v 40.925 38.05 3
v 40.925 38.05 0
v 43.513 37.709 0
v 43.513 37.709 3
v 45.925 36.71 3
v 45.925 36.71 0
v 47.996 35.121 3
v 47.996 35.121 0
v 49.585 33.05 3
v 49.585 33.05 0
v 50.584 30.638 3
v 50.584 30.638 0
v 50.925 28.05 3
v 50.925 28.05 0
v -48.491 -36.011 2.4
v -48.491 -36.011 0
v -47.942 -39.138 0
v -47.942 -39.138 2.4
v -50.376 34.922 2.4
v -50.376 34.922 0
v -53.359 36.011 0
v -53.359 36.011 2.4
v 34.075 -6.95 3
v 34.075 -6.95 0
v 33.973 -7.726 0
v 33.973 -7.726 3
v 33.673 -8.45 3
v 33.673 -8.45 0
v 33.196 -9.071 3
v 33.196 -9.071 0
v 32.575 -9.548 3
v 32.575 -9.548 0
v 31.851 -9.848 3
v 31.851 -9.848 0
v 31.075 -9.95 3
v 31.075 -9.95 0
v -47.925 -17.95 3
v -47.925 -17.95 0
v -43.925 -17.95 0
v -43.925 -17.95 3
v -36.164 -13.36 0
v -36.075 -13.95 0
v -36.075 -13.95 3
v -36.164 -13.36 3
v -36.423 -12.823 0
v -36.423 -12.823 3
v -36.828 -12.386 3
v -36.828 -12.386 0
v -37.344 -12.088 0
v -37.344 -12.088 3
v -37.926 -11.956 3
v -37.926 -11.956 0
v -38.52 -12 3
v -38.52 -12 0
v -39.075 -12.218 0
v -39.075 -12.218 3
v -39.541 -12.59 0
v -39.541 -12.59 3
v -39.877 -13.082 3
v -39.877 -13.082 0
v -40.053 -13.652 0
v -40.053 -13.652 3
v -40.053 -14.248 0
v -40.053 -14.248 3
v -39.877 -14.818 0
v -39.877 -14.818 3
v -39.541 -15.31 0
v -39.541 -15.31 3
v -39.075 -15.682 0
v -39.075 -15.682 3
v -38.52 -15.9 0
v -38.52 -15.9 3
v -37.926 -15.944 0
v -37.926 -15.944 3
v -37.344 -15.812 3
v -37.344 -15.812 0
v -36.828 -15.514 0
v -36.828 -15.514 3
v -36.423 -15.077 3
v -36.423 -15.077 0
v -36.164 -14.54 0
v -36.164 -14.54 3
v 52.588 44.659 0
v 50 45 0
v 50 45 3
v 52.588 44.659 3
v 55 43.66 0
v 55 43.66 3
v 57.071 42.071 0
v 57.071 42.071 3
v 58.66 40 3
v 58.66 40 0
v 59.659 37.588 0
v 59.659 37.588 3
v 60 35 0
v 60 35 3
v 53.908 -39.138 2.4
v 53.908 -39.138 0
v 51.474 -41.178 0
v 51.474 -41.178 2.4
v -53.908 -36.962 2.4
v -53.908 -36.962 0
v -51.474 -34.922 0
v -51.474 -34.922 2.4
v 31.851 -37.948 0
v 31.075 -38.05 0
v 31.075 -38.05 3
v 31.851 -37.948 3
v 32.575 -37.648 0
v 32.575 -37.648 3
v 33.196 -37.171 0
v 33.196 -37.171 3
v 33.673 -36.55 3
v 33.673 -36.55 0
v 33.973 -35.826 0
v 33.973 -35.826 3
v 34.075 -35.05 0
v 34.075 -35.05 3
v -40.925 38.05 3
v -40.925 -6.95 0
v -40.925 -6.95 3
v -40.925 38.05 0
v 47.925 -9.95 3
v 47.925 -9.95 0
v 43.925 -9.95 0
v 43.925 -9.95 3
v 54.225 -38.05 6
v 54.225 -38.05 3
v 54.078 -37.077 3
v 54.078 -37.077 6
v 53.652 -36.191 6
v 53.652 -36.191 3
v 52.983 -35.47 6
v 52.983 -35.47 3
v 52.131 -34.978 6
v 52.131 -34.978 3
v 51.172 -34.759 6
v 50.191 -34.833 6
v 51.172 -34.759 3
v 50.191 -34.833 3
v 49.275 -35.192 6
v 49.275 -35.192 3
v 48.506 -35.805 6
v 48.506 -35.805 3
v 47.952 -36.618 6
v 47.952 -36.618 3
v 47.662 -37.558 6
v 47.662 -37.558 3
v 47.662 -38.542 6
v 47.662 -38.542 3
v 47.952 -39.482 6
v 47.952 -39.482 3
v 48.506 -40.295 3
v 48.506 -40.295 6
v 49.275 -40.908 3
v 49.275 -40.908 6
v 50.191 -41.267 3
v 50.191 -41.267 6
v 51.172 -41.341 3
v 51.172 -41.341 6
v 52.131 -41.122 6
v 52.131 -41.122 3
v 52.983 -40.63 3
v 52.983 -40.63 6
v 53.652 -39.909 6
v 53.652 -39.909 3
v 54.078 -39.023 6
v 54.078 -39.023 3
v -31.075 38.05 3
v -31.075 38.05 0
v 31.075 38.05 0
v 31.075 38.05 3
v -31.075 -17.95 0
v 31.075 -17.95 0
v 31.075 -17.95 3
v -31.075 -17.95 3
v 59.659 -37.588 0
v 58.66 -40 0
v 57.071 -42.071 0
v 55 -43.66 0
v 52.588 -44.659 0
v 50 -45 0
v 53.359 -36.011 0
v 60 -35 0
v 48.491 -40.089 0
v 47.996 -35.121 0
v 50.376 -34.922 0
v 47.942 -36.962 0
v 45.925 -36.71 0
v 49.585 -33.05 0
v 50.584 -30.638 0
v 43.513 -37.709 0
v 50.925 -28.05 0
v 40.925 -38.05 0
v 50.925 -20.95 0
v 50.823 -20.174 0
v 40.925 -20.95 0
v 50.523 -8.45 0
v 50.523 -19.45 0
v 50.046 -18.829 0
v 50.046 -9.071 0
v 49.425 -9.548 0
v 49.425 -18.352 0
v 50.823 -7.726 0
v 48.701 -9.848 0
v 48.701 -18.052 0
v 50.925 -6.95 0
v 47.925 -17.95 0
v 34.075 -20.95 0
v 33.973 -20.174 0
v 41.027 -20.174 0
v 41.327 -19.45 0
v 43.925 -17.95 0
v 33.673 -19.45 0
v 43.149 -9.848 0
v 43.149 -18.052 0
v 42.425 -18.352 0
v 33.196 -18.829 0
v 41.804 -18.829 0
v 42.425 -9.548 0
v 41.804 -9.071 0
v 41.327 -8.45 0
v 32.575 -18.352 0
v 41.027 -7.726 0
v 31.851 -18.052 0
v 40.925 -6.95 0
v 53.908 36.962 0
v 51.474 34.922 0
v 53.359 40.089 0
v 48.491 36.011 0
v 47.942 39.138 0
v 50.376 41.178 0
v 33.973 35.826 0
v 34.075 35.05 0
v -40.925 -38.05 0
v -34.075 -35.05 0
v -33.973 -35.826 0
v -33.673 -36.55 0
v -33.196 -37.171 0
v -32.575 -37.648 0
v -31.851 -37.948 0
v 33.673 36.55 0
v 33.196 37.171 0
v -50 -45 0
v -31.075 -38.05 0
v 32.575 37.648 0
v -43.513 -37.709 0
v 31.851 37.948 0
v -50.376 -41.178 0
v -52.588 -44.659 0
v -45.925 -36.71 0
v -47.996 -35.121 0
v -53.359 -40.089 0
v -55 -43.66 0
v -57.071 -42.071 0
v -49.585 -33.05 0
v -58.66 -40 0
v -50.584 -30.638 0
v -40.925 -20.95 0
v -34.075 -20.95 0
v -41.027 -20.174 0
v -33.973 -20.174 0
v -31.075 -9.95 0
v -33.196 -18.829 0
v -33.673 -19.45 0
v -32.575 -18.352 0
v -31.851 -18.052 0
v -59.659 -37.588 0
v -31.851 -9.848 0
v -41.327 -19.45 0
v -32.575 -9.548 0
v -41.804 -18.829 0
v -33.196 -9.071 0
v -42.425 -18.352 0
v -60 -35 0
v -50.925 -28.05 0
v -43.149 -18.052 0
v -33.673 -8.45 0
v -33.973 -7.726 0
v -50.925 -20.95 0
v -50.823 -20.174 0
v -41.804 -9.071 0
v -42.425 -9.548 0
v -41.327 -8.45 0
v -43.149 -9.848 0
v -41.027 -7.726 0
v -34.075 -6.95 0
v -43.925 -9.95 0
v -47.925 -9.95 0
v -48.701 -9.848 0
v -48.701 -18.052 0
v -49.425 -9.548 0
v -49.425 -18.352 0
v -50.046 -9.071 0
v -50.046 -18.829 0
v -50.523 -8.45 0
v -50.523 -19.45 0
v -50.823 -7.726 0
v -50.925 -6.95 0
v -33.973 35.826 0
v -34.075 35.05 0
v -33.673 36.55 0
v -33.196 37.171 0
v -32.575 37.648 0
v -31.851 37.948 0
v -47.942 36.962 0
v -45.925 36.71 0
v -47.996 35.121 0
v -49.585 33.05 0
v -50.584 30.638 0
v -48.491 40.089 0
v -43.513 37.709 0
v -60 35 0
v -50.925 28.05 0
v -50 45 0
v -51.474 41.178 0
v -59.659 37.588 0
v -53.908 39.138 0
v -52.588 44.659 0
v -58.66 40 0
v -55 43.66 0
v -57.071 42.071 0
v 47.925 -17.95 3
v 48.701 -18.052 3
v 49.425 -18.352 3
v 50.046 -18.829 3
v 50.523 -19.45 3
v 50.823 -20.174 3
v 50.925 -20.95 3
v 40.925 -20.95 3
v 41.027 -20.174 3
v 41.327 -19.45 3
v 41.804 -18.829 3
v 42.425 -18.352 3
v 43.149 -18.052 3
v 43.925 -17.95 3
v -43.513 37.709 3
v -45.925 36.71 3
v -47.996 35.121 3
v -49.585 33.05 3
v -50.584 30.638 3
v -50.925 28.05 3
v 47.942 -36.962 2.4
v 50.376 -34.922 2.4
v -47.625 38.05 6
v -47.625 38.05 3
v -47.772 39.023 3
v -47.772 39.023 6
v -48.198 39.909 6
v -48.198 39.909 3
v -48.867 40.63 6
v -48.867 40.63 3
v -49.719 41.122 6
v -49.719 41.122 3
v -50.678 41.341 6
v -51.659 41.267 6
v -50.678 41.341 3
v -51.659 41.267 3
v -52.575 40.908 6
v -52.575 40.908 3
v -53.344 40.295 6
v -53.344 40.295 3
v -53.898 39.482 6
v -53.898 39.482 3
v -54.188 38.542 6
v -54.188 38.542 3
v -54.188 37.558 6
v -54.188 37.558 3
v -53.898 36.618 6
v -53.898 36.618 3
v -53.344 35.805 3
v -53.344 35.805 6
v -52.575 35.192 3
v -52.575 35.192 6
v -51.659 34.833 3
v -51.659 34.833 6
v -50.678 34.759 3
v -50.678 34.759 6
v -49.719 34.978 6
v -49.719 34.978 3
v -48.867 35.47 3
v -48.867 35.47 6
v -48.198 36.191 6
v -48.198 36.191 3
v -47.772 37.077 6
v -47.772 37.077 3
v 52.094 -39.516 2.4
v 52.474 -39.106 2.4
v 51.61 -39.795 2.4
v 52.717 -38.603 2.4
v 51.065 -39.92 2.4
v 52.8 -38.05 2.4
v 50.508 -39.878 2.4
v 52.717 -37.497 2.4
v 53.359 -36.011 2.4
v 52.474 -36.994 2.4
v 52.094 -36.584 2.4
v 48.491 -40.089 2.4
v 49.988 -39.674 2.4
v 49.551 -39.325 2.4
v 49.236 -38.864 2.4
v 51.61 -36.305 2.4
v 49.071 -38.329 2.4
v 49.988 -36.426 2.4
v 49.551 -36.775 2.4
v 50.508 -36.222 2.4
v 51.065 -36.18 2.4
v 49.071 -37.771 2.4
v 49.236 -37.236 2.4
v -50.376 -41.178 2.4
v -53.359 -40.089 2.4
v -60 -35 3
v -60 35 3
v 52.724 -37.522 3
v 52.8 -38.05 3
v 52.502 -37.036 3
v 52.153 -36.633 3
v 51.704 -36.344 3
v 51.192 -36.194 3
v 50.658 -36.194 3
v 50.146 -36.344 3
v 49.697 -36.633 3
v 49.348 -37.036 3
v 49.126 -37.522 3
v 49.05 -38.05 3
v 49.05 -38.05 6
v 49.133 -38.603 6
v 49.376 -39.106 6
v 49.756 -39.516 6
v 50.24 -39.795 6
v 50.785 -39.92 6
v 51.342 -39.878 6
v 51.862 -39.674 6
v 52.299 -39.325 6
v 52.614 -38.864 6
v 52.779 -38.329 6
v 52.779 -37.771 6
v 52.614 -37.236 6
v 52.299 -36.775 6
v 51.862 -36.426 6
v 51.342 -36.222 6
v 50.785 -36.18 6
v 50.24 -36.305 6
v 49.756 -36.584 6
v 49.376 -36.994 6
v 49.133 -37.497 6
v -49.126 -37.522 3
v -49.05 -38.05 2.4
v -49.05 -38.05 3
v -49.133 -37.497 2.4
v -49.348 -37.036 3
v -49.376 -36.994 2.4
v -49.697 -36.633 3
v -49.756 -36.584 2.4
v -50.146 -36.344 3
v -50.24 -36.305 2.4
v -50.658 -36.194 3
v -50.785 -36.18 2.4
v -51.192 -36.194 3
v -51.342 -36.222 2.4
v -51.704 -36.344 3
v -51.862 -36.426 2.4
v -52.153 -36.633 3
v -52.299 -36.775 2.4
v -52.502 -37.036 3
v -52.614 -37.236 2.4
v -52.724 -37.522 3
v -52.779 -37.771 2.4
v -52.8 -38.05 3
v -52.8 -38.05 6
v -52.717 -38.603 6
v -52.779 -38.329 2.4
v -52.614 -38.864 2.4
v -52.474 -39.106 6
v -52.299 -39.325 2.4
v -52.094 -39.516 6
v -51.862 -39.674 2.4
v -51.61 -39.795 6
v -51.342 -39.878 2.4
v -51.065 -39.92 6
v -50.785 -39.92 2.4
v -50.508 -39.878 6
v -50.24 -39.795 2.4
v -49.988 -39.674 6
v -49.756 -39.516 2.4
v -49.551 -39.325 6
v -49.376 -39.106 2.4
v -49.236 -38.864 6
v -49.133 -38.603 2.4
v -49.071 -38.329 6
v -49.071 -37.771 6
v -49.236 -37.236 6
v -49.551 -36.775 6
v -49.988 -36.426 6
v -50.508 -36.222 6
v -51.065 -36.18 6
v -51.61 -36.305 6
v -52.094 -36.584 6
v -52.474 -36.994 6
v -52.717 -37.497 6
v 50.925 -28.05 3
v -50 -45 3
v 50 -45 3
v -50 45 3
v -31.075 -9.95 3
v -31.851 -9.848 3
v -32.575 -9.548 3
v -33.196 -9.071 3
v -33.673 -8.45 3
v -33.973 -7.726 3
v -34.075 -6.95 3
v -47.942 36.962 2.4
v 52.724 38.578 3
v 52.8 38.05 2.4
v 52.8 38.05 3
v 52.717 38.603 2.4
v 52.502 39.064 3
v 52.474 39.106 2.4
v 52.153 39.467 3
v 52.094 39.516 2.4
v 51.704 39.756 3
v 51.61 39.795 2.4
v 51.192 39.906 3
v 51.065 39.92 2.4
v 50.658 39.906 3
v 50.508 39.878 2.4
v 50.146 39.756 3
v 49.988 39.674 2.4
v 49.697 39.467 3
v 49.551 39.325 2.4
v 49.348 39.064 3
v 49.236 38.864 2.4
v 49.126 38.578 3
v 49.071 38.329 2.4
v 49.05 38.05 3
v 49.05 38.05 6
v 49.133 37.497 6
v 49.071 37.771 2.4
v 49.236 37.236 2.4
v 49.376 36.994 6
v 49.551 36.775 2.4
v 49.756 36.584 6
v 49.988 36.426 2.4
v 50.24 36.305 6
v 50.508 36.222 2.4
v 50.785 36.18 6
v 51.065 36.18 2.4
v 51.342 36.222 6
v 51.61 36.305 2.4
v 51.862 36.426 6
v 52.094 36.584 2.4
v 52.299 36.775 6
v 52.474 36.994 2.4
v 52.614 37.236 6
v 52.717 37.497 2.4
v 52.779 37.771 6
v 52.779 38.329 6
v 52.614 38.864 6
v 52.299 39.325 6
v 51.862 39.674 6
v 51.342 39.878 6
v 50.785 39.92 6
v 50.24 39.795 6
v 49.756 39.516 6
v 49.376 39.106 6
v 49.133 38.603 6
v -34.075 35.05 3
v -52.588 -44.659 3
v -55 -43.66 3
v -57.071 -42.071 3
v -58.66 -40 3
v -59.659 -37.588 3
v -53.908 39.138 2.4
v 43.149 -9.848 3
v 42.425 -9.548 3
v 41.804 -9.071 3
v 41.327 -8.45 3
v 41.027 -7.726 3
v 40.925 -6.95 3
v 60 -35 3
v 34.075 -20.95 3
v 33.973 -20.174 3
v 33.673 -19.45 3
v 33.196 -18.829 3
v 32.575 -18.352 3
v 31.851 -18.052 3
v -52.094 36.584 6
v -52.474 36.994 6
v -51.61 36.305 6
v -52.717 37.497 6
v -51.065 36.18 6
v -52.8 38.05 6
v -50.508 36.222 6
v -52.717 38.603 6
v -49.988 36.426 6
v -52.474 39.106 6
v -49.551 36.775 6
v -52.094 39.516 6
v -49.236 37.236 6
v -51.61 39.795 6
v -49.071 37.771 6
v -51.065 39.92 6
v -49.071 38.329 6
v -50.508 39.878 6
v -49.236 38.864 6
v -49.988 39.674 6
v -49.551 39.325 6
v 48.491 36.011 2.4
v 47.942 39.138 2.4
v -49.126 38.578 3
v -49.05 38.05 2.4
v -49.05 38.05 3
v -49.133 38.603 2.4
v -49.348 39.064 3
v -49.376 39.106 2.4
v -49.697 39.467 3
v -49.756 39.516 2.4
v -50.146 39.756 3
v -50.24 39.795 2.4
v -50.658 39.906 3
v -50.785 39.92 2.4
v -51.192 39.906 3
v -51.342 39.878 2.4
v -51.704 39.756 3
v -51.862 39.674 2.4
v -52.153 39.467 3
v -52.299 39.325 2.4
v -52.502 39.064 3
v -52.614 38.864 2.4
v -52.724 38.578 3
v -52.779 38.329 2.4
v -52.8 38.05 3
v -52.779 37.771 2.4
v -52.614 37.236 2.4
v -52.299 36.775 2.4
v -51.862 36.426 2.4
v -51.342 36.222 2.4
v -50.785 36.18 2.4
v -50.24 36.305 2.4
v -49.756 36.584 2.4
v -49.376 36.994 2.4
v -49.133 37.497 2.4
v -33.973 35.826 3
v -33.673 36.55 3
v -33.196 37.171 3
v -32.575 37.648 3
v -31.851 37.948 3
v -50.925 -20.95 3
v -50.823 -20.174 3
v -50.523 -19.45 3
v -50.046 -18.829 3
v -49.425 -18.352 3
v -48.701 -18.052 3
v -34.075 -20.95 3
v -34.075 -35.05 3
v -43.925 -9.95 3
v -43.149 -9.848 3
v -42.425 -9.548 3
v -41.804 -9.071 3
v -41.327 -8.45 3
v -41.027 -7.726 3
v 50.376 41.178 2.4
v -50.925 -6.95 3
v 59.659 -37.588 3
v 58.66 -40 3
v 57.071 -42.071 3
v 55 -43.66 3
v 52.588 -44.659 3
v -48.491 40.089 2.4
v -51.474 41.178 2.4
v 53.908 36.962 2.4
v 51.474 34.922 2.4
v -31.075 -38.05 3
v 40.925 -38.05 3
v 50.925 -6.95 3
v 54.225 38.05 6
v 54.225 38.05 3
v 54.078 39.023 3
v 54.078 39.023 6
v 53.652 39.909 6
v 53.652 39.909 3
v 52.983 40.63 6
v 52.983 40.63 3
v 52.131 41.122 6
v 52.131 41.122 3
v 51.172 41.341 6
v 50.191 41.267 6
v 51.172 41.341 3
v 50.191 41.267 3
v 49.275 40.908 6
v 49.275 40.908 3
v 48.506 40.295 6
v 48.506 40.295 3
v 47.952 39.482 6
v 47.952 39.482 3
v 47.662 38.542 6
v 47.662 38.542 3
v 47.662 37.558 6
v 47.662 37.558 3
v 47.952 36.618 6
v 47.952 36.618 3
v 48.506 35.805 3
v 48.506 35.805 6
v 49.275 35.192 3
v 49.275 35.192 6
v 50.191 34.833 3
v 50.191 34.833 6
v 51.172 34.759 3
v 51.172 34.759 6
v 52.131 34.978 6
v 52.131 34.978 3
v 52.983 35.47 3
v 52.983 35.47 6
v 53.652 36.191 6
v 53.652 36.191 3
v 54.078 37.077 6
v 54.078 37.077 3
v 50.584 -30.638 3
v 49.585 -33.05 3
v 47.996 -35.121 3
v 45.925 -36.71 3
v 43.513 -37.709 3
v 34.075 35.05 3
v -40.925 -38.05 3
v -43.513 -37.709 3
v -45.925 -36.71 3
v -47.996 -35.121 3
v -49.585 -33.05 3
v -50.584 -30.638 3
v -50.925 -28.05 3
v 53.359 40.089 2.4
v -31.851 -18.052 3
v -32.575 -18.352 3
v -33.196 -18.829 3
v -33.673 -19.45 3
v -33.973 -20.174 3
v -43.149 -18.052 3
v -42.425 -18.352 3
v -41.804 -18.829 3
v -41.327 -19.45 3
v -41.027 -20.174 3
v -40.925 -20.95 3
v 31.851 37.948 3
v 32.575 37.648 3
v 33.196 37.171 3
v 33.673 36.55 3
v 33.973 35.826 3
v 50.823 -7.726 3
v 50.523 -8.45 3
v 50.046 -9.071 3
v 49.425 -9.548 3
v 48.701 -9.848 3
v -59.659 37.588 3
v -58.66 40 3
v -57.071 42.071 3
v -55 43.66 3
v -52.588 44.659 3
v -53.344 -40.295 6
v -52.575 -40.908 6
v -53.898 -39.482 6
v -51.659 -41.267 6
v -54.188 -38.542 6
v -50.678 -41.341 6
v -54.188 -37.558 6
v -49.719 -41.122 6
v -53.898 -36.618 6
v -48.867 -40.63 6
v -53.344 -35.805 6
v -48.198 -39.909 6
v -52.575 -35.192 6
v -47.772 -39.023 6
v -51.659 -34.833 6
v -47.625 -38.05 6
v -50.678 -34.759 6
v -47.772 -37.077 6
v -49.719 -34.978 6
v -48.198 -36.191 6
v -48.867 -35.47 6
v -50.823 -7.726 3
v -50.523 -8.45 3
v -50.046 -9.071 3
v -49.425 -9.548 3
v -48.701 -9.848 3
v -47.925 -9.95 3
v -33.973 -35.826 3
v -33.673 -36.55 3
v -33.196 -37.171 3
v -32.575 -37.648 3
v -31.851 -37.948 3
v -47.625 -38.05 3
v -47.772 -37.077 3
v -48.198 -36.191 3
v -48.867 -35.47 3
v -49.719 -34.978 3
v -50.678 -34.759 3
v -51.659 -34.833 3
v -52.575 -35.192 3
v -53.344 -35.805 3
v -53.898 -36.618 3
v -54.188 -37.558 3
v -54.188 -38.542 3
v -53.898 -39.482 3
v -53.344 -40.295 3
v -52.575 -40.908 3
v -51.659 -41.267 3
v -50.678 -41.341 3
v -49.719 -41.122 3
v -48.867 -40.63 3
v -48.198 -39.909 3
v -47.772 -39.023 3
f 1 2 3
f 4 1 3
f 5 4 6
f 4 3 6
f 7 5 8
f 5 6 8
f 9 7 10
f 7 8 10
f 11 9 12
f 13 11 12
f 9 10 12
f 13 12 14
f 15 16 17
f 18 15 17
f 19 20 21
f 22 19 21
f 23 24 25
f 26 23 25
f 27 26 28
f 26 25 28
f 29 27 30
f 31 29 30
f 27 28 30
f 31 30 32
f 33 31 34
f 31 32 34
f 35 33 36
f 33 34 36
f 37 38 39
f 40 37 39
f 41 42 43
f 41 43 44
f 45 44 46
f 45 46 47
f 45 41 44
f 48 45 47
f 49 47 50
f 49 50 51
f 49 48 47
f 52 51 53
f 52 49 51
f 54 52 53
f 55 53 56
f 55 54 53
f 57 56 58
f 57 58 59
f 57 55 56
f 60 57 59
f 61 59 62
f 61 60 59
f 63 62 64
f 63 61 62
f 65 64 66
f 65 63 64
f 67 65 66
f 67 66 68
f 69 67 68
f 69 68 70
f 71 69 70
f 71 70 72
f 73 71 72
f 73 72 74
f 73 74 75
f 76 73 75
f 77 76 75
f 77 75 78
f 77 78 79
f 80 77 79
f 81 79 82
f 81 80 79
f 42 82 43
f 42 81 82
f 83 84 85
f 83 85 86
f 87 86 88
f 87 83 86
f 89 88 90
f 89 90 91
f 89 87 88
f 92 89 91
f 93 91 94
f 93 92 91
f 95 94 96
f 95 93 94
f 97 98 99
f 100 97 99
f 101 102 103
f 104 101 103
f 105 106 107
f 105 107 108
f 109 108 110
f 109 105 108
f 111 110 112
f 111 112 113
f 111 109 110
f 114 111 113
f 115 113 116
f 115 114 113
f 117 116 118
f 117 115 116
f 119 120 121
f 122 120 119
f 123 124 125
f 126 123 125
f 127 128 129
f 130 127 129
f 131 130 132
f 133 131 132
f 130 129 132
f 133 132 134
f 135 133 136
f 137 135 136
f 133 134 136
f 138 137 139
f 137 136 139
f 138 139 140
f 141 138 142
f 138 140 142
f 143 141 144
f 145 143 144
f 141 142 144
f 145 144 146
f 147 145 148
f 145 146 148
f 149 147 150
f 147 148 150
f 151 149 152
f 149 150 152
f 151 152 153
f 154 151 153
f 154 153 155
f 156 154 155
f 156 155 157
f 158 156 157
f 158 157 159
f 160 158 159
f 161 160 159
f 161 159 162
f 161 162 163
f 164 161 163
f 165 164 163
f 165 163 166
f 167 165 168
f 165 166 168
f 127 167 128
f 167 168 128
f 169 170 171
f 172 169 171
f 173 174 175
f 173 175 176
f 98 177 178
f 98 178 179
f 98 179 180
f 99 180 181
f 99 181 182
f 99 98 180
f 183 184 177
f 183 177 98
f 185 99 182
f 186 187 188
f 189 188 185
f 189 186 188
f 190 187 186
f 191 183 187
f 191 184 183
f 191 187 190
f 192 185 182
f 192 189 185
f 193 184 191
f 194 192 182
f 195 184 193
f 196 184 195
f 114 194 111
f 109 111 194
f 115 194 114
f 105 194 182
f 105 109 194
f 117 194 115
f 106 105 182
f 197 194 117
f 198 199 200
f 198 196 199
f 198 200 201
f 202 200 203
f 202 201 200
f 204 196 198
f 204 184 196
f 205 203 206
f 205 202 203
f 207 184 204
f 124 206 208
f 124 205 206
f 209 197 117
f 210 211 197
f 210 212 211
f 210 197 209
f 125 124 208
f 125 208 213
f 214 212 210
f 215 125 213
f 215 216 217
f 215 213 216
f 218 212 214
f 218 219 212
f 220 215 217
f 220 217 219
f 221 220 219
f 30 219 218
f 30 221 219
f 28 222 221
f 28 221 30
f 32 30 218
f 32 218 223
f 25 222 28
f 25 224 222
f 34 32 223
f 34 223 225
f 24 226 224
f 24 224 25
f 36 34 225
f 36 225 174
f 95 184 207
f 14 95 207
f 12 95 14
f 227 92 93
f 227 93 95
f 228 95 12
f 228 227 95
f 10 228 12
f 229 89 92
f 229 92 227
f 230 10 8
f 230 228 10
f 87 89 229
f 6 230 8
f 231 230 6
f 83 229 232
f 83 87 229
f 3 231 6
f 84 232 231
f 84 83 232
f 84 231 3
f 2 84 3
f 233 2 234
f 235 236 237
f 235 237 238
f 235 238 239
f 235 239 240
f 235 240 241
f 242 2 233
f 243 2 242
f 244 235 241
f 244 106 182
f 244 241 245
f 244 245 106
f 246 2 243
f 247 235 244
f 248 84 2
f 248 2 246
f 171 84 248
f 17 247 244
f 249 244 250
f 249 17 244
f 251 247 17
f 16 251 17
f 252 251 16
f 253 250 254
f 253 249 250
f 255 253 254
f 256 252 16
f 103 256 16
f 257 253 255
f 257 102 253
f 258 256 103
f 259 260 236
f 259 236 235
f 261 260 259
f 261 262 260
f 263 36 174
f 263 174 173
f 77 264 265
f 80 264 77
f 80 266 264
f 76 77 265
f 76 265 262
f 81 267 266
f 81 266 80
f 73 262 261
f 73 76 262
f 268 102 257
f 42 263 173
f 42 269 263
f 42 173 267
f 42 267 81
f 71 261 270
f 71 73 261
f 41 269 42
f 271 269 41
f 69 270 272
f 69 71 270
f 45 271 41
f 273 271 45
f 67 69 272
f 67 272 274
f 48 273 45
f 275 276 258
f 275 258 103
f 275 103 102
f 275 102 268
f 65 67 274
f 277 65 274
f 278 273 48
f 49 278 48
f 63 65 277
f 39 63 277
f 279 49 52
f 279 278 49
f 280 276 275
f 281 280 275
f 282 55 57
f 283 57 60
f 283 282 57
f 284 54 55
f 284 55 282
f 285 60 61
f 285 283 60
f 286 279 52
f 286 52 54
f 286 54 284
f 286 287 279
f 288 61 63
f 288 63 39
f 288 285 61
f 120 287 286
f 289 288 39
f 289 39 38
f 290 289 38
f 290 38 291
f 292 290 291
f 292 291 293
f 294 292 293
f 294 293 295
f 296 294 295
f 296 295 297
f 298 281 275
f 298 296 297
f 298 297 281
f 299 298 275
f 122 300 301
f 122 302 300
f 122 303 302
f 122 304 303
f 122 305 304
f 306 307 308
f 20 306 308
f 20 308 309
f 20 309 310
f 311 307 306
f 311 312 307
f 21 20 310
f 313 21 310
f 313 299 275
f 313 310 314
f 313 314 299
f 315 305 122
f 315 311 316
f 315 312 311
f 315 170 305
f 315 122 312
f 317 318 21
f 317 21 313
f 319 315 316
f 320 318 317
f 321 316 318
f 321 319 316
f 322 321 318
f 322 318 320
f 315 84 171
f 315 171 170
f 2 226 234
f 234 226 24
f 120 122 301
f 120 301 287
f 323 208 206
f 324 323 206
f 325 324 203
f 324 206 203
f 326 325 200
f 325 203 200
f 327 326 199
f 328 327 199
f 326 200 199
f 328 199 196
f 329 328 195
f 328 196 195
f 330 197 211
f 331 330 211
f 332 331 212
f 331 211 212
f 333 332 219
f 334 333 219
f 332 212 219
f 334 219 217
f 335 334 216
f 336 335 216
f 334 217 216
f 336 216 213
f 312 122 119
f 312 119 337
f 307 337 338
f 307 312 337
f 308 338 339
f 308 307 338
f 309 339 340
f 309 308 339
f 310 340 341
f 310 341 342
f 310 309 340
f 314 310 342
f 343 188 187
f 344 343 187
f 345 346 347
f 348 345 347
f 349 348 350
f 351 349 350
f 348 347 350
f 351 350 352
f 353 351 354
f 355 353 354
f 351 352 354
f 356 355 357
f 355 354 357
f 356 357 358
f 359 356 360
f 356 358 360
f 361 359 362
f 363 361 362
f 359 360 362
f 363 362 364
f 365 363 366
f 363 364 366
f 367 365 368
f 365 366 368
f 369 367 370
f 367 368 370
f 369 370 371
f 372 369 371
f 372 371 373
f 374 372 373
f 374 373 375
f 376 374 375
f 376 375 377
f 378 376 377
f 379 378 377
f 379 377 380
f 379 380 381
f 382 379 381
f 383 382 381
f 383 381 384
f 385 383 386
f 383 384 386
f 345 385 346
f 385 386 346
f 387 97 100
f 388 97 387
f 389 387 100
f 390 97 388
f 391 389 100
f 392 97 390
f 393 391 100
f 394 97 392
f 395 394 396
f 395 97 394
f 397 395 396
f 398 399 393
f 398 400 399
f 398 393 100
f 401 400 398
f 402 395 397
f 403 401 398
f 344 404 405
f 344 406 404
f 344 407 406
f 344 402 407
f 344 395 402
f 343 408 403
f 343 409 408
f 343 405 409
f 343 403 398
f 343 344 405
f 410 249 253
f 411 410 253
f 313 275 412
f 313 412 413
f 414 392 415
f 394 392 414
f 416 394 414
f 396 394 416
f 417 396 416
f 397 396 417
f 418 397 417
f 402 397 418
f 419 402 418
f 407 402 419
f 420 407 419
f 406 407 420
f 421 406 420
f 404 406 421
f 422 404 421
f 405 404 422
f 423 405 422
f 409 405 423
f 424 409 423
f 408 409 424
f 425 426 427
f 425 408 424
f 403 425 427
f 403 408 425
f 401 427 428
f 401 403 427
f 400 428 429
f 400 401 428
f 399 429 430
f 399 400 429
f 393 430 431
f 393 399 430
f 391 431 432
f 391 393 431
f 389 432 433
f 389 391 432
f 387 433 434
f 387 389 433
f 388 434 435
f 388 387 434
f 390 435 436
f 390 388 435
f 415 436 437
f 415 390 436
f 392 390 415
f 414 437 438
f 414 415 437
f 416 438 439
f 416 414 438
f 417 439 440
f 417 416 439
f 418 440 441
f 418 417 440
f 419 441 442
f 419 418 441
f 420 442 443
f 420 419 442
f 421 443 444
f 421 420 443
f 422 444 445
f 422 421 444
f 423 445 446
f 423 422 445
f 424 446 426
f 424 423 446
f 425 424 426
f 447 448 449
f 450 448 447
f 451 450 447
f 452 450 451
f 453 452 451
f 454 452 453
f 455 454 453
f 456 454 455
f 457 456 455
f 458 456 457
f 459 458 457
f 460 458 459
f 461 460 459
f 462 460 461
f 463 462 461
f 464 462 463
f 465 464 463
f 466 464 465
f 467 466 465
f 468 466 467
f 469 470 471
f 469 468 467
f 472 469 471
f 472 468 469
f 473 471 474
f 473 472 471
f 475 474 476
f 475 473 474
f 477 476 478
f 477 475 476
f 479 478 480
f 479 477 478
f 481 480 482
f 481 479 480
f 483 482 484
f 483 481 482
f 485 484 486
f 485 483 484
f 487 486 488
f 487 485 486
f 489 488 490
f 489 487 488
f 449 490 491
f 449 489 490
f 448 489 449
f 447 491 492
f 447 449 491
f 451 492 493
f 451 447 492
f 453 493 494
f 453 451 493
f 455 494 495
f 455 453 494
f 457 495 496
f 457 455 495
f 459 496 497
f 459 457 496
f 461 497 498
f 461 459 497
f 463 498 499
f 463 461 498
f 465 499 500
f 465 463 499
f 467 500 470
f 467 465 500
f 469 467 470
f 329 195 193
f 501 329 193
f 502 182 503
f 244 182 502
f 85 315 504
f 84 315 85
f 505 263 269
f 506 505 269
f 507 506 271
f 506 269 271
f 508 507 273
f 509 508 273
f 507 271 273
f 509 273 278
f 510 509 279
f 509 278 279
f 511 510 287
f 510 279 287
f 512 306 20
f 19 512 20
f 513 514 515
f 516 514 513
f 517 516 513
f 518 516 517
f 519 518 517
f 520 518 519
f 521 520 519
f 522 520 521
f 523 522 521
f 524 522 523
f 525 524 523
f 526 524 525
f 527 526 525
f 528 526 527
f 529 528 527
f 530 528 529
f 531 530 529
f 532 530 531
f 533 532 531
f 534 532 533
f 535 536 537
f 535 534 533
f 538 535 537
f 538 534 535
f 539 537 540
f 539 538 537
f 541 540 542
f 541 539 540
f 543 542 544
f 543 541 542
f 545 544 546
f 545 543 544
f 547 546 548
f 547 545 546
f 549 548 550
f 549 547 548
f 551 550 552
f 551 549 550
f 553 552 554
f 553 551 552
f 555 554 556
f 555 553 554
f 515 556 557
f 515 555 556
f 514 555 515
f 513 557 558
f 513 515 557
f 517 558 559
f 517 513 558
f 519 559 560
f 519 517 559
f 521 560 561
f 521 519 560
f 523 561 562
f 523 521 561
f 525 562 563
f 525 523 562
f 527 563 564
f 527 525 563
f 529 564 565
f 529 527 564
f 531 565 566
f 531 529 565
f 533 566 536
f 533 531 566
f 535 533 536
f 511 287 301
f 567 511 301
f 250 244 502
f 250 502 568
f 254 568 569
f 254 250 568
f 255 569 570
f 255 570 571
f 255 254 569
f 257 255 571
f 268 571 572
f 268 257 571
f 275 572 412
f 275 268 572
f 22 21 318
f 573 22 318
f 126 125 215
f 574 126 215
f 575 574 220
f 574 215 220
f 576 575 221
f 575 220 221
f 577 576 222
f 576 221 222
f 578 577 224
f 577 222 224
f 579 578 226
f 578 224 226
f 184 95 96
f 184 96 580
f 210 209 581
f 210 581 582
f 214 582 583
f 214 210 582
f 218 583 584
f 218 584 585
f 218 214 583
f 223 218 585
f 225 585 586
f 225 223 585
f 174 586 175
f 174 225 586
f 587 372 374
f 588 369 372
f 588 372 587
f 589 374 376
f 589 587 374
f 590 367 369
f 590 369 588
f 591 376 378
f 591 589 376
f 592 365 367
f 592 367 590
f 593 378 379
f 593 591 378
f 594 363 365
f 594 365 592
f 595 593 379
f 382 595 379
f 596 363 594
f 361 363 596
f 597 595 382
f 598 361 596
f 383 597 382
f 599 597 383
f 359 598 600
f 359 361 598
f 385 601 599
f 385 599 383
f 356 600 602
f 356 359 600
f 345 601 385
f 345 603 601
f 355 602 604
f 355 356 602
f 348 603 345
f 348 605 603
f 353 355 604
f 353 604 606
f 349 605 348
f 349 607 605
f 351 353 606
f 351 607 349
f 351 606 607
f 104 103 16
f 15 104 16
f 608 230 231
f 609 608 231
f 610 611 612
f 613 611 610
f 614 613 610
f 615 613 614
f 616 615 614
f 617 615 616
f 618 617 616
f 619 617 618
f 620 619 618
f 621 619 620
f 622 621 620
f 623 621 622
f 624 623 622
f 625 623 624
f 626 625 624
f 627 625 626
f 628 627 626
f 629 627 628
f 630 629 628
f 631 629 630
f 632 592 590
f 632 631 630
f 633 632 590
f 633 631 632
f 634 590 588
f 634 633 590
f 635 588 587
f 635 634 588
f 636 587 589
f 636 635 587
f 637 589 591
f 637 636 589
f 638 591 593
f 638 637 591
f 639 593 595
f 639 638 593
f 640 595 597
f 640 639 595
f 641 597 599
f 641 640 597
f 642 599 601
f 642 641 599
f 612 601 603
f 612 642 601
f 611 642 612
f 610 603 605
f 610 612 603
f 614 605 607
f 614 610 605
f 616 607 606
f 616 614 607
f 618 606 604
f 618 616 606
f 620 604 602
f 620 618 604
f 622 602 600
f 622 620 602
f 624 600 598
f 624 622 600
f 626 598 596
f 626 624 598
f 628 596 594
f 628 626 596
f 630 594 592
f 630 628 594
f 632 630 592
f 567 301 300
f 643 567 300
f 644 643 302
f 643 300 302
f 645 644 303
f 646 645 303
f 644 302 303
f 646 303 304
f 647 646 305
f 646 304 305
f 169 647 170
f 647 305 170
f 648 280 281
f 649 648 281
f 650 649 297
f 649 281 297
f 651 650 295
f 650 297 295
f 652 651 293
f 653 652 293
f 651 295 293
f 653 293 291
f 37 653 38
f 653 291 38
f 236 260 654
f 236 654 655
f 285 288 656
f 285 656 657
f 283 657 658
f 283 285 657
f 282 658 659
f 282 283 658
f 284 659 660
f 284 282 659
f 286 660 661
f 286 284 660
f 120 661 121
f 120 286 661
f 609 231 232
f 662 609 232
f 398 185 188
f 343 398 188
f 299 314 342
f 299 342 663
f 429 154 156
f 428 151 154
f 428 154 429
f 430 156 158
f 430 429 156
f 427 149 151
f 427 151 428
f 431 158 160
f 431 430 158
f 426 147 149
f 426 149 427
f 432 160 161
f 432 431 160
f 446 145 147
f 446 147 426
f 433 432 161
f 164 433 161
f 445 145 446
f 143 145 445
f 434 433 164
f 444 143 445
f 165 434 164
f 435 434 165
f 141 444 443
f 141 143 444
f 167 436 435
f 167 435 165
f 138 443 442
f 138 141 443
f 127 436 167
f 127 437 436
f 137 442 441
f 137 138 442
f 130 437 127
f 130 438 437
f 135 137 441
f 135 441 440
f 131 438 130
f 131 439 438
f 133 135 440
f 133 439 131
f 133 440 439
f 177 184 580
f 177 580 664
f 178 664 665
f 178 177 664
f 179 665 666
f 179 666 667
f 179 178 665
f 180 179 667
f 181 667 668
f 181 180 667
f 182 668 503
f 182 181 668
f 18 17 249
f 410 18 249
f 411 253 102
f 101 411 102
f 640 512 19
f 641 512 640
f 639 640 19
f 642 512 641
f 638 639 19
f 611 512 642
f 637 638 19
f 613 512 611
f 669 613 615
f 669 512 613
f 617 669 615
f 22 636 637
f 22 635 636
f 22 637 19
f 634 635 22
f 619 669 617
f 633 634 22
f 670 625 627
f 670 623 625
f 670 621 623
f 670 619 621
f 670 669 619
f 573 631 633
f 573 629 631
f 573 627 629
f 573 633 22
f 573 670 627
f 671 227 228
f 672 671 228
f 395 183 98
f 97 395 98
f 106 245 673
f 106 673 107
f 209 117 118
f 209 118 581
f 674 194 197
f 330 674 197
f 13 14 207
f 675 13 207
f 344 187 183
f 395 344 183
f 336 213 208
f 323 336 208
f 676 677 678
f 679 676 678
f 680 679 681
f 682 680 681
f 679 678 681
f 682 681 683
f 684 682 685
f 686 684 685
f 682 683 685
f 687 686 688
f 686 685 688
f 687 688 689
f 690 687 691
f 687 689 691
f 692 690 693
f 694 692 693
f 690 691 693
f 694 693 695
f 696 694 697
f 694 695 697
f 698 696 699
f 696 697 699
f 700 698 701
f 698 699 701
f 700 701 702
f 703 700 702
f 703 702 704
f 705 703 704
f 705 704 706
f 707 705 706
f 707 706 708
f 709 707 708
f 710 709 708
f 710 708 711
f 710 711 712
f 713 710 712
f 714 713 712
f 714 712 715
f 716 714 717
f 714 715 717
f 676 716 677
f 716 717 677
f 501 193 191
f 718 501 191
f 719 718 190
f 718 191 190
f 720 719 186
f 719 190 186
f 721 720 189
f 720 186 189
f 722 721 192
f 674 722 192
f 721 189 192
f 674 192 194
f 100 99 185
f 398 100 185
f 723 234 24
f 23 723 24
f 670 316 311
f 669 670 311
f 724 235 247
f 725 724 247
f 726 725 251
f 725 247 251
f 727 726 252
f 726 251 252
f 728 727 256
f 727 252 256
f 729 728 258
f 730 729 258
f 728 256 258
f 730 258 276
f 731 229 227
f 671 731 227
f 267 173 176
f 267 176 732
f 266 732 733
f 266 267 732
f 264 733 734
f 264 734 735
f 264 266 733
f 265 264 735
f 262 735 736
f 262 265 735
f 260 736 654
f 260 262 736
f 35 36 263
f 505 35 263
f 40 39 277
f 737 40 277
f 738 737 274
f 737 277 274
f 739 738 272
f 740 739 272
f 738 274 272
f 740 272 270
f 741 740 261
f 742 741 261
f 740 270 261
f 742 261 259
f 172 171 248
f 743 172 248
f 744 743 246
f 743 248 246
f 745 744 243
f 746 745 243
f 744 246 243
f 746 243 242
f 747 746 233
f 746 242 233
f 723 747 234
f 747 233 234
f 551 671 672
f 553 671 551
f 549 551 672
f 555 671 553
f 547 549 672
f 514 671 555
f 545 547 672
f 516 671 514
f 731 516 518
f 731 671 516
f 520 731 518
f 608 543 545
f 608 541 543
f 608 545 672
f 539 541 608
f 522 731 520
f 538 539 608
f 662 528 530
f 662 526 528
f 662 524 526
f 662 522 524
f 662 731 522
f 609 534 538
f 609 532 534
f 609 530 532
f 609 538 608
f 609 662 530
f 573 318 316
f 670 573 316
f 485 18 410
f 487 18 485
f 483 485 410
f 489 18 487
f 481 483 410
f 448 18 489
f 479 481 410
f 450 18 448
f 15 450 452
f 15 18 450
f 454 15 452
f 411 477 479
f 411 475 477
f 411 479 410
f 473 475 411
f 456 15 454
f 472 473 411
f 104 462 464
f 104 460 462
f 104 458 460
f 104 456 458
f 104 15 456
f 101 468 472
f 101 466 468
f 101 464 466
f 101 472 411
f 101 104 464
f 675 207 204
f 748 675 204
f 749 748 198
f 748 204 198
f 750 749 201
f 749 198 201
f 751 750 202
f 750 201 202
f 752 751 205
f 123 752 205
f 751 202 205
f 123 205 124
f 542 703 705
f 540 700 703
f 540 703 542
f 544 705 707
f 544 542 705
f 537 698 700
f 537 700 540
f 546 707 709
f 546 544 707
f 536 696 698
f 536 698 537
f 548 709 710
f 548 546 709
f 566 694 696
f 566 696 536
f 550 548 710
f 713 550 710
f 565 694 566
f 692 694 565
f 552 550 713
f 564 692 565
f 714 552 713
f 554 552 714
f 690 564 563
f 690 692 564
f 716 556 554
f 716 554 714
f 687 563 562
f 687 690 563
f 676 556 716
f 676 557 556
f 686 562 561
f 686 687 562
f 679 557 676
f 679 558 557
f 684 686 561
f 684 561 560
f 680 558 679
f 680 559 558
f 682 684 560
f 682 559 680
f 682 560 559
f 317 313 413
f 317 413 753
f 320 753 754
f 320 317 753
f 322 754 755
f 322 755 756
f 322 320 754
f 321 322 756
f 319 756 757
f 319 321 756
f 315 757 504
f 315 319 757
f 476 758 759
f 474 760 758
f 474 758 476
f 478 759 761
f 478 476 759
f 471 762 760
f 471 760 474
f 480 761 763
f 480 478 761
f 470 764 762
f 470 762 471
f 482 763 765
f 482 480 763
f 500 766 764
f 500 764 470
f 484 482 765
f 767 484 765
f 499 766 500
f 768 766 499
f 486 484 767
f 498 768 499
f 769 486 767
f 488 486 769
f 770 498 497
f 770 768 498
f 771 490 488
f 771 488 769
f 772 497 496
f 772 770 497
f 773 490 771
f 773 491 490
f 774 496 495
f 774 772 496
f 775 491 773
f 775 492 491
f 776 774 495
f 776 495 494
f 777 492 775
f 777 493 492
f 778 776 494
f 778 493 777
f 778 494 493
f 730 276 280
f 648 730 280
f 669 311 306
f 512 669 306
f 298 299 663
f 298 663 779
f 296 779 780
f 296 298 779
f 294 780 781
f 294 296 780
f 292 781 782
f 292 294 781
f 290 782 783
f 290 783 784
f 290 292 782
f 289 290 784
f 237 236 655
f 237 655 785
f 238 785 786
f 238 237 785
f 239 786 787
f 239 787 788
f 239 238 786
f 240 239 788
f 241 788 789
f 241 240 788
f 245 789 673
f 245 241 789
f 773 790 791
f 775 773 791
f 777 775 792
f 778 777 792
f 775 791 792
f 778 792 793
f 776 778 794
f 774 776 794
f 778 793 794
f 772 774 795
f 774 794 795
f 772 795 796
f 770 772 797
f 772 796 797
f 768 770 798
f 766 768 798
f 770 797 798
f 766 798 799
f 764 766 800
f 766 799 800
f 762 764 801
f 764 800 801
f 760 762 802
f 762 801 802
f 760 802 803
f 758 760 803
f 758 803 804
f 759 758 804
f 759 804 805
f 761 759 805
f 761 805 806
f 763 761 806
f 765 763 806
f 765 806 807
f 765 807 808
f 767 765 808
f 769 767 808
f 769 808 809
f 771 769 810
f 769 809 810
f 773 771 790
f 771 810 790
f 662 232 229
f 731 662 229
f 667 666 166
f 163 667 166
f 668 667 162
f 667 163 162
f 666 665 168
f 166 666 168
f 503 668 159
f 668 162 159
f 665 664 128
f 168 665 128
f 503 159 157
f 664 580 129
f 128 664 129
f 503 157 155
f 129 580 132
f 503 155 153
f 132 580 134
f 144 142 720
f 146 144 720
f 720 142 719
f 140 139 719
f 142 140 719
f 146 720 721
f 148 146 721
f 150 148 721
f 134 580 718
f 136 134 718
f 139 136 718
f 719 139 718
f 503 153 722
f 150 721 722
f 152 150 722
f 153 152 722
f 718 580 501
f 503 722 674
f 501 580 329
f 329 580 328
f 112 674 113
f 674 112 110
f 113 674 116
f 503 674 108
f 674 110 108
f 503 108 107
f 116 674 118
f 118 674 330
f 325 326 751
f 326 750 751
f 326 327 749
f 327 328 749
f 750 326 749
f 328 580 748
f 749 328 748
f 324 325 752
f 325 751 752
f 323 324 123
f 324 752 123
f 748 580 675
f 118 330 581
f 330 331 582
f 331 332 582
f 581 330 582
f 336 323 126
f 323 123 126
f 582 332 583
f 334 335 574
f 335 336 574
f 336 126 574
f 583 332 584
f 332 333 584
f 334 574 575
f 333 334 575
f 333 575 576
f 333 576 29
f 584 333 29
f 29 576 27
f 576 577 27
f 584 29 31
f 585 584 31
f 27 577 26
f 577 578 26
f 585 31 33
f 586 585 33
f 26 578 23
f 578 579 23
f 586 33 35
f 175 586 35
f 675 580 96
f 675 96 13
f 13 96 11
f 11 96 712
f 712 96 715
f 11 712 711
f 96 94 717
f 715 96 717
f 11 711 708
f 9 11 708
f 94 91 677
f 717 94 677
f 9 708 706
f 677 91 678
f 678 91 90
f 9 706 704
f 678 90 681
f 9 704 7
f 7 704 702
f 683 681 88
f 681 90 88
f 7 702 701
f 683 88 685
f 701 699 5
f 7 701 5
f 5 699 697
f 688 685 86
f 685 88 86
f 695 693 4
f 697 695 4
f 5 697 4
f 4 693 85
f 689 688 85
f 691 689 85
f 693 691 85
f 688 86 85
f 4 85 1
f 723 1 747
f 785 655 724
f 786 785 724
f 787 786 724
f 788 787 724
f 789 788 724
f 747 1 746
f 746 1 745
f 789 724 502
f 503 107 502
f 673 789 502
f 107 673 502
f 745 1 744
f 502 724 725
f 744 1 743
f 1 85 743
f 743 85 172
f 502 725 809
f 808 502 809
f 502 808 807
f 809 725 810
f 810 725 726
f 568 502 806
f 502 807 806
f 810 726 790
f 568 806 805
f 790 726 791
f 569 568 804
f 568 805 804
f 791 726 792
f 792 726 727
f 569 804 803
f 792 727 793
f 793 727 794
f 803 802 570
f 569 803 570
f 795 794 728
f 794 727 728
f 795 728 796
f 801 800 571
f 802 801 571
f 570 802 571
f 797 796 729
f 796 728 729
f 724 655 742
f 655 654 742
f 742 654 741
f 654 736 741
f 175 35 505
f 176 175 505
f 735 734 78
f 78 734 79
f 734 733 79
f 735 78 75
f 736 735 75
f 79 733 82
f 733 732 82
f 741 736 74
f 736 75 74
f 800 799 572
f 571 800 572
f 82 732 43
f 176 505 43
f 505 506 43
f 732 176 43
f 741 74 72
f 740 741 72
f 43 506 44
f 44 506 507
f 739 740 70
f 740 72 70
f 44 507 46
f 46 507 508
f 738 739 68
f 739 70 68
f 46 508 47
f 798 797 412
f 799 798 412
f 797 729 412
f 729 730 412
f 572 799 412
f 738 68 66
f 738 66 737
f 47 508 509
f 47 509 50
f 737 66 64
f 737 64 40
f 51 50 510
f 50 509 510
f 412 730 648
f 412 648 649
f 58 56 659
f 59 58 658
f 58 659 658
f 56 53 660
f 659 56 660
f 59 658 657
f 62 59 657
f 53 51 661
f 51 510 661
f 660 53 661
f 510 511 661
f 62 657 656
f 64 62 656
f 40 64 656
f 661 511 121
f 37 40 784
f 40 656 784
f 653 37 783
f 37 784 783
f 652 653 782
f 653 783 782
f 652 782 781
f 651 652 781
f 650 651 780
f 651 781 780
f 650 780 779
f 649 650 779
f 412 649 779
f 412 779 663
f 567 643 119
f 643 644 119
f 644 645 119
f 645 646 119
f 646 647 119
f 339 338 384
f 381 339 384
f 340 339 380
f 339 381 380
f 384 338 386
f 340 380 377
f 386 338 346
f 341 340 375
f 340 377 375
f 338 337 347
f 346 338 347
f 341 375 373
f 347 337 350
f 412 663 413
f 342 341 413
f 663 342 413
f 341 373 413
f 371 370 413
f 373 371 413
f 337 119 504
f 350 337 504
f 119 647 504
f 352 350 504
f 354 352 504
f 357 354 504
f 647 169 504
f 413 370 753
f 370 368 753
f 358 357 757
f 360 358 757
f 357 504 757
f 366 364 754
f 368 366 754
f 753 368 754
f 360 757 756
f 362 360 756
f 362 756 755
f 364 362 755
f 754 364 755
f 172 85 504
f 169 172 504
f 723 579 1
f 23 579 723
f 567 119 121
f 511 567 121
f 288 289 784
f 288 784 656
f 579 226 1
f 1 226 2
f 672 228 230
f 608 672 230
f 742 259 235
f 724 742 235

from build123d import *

# Parameters (mm, degrees)
IZIM1_R                     = 1.875
IZIM1_R_2                   = 2
Y_KSEKLIK_EKSTR_ZYON2_DEPTH = 3
KES_EKSTR_ZYON1_DEPTH       = 2.4
IZIM3_R                     = 3.3
IZIM3_R_2                   = 1.875
Y_KSEKLIK_EKSTR_ZYON3_DEPTH = 3


with BuildPart() as part:
    # Çizim1 → Yükseklik-Ekstrüzyon2 (new body)
    with BuildSketch(Plane.XY):
        with BuildLine():
            Line((-50, 45), (50, 45))
            ThreePointArc((50, 45), (57.071067812, 42.071067812), (60, 35))
            Line((60, 35), (60, -35))
            ThreePointArc((60, -35), (57.071067812, -42.071067812), (50, -45))
            Line((50, -45), (-50, -45))
            ThreePointArc((-50, -45), (-57.071067812, -42.071067812), (-60, -35))
            Line((-60, -35), (-60, 35))
            ThreePointArc((-60, 35), (-57.071067812, 42.071067812), (-50, 45))
        make_face()
        with Locations((-50.925, 38.05)):
            Circle(IZIM1_R, mode=Mode.SUBTRACT)
        with Locations((50.925, 38.05)):
            Circle(IZIM1_R, mode=Mode.SUBTRACT)
        with Locations((-50.925, -38.05)):
            Circle(IZIM1_R, mode=Mode.SUBTRACT)
        with Locations((50.925, -38.05)):
            Circle(IZIM1_R, mode=Mode.SUBTRACT)
        with Locations((-38.075, -13.95)):
            Circle(IZIM1_R_2, mode=Mode.SUBTRACT)
        with BuildLine():
            Line((-31.075, -38.05), (31.075, -38.05))
            ThreePointArc((31.075, -38.05), (33.196320344, -37.171320344), (34.075, -35.05))
            Line((34.075, -35.05), (34.075, -20.95))
            ThreePointArc((34.075, -20.95), (33.196320344, -18.828679656), (31.075, -17.95))
            Line((31.075, -17.95), (-31.075, -17.95))
            ThreePointArc((-31.075, -17.95), (-33.196320344, -18.828679656), (-34.075, -20.95))
            Line((-34.075, -20.95), (-34.075, -35.05))
            ThreePointArc((-34.075, -35.05), (-33.196320344, -37.171320344), (-31.075, -38.05))
        make_face(mode=Mode.SUBTRACT)
        with BuildLine():
            Line((50.925, 28.05), (50.925, -6.95))
            ThreePointArc((50.925, -6.95), (50.046320344, -9.071320344), (47.925, -9.95))
            Line((47.925, -9.95), (43.925, -9.95))
            ThreePointArc((43.925, -9.95), (41.803679656, -9.071320344), (40.925, -6.95))
            Line((40.925, -6.95), (40.925, 38.05))
            ThreePointArc((40.925, 38.05), (47.996067812, 35.121067812), (50.925, 28.05))
        make_face(mode=Mode.SUBTRACT)
        with BuildLine():
            Line((-31.075, 38.05), (31.075, 38.05))
            ThreePointArc((31.075, 38.05), (33.196320344, 37.171320344), (34.075, 35.05))
            Line((34.075, 35.05), (34.075, -6.95))
            ThreePointArc((34.075, -6.95), (33.196320344, -9.071320344), (31.075, -9.95))
            Line((31.075, -9.95), (-31.075, -9.95))
            ThreePointArc((-31.075, -9.95), (-33.196320344, -9.071320344), (-34.075, -6.95))
            Line((-34.075, -6.95), (-34.075, 35.05))
            ThreePointArc((-34.075, 35.05), (-33.196320344, 37.171320344), (-31.075, 38.05))
        make_face(mode=Mode.SUBTRACT)
        with BuildLine():
            Line((-50.925, 28.05), (-50.925, -6.95))
            ThreePointArc((-50.925, -6.95), (-50.046320344, -9.071320344), (-47.925, -9.95))
            Line((-47.925, -9.95), (-43.925, -9.95))
            ThreePointArc((-43.925, -9.95), (-41.803679656, -9.071320344), (-40.925, -6.95))
            Line((-40.925, -6.95), (-40.925, 38.05))
            ThreePointArc((-40.925, 38.05), (-47.996067812, 35.121067812), (-50.925, 28.05))
        make_face(mode=Mode.SUBTRACT)
        with BuildLine():
            Line((-47.925, -17.95), (-43.925, -17.95))
            ThreePointArc((-43.925, -17.95), (-41.803679656, -18.828679656), (-40.925, -20.95))
            Line((-40.925, -20.95), (-40.925, -38.05))
            ThreePointArc((-40.925, -38.05), (-47.996067812, -35.121067812), (-50.925, -28.05))
            Line((-50.925, -28.05), (-50.925, -20.95))
            ThreePointArc((-50.925, -20.95), (-50.046320344, -18.828679656), (-47.925, -17.95))
        make_face(mode=Mode.SUBTRACT)
        with BuildLine():
            Line((50.925, -20.95), (50.925, -28.05))
            ThreePointArc((50.925, -28.05), (47.996067812, -35.121067812), (40.925, -38.05))
            Line((40.925, -38.05), (40.925, -20.95))
            ThreePointArc((40.925, -20.95), (41.803679656, -18.828679656), (43.925, -17.95))
            Line((43.925, -17.95), (47.925, -17.95))
            ThreePointArc((47.925, -17.95), (50.046320344, -18.828679656), (50.925, -20.95))
        make_face(mode=Mode.SUBTRACT)
    extrude(amount=Y_KSEKLIK_EKSTR_ZYON2_DEPTH)

    # Çizim2 → Kes-Ekstrüzyon1 (cut)
    with BuildSketch(Plane(origin=(0, 0, 0), x_dir=(-1, 0, 0), z_dir=(0, 0, -1))):
        Polygon((-53.35905554, -36.010709201), (-53.908105407, -39.138308533), (-51.474049867, -41.177599331), (-48.49094446, -40.089290799), (-47.941894593, -36.961691467), (-50.375950133, -34.922400669), align=None)
        Polygon((48.49094446, -36.010709201), (47.941894593, -39.138308533), (50.375950133, -41.177599331), (53.35905554, -40.089290799), (53.908105407, -36.961691467), (51.474049867, -34.922400669), align=None)
        Polygon((48.49094446, 40.089290799), (47.941894593, 36.961691467), (50.375950133, 34.922400669), (53.35905554, 36.010709201), (53.908105407, 39.138308533), (51.474049867, 41.177599331), align=None)
        Polygon((-53.35905554, 40.089290799), (-53.908105407, 36.961691467), (-51.474049867, 34.922400669), (-48.49094446, 36.010709201), (-47.941894593, 39.138308533), (-50.375950133, 41.177599331), align=None)
    extrude(amount=-KES_EKSTR_ZYON1_DEPTH, mode=Mode.SUBTRACT)

    # Çizim3 → Yükseklik-Ekstrüzyon3 (add)
    # profile 1 of 4: a face of its own
    with BuildSketch(Plane.XY.offset(3)):
        with Locations((-50.925, 38.05)):
            Circle(IZIM3_R)
        with Locations(Location((-50.925, 38.05, 0), (0, 0, 180))):
            Circle(IZIM3_R_2, mode=Mode.SUBTRACT)
    # profile 2 of 4: a face of its own
    with BuildSketch(Plane.XY.offset(3)):
        with Locations((50.925, 38.05)):
            Circle(IZIM3_R)
        with Locations(Location((50.925, 38.05, 0), (0, 0, 180))):
            Circle(IZIM3_R_2, mode=Mode.SUBTRACT)
    # profile 3 of 4: a face of its own
    with BuildSketch(Plane.XY.offset(3)):
        with Locations((-50.925, -38.05)):
            Circle(IZIM3_R)
        with Locations(Location((-50.925, -38.05, 0), (0, 0, 180))):
            Circle(IZIM3_R_2, mode=Mode.SUBTRACT)
    # profile 4 of 4: a face of its own
    with BuildSketch(Plane.XY.offset(3)):
        with Locations((50.925, -38.05)):
            Circle(IZIM3_R)
        with Locations(Location((50.925, -38.05, 0), (0, 0, 180))):
            Circle(IZIM3_R_2, mode=Mode.SUBTRACT)
    extrude(amount=Y_KSEKLIK_EKSTR_ZYON3_DEPTH)


solid = part.part
